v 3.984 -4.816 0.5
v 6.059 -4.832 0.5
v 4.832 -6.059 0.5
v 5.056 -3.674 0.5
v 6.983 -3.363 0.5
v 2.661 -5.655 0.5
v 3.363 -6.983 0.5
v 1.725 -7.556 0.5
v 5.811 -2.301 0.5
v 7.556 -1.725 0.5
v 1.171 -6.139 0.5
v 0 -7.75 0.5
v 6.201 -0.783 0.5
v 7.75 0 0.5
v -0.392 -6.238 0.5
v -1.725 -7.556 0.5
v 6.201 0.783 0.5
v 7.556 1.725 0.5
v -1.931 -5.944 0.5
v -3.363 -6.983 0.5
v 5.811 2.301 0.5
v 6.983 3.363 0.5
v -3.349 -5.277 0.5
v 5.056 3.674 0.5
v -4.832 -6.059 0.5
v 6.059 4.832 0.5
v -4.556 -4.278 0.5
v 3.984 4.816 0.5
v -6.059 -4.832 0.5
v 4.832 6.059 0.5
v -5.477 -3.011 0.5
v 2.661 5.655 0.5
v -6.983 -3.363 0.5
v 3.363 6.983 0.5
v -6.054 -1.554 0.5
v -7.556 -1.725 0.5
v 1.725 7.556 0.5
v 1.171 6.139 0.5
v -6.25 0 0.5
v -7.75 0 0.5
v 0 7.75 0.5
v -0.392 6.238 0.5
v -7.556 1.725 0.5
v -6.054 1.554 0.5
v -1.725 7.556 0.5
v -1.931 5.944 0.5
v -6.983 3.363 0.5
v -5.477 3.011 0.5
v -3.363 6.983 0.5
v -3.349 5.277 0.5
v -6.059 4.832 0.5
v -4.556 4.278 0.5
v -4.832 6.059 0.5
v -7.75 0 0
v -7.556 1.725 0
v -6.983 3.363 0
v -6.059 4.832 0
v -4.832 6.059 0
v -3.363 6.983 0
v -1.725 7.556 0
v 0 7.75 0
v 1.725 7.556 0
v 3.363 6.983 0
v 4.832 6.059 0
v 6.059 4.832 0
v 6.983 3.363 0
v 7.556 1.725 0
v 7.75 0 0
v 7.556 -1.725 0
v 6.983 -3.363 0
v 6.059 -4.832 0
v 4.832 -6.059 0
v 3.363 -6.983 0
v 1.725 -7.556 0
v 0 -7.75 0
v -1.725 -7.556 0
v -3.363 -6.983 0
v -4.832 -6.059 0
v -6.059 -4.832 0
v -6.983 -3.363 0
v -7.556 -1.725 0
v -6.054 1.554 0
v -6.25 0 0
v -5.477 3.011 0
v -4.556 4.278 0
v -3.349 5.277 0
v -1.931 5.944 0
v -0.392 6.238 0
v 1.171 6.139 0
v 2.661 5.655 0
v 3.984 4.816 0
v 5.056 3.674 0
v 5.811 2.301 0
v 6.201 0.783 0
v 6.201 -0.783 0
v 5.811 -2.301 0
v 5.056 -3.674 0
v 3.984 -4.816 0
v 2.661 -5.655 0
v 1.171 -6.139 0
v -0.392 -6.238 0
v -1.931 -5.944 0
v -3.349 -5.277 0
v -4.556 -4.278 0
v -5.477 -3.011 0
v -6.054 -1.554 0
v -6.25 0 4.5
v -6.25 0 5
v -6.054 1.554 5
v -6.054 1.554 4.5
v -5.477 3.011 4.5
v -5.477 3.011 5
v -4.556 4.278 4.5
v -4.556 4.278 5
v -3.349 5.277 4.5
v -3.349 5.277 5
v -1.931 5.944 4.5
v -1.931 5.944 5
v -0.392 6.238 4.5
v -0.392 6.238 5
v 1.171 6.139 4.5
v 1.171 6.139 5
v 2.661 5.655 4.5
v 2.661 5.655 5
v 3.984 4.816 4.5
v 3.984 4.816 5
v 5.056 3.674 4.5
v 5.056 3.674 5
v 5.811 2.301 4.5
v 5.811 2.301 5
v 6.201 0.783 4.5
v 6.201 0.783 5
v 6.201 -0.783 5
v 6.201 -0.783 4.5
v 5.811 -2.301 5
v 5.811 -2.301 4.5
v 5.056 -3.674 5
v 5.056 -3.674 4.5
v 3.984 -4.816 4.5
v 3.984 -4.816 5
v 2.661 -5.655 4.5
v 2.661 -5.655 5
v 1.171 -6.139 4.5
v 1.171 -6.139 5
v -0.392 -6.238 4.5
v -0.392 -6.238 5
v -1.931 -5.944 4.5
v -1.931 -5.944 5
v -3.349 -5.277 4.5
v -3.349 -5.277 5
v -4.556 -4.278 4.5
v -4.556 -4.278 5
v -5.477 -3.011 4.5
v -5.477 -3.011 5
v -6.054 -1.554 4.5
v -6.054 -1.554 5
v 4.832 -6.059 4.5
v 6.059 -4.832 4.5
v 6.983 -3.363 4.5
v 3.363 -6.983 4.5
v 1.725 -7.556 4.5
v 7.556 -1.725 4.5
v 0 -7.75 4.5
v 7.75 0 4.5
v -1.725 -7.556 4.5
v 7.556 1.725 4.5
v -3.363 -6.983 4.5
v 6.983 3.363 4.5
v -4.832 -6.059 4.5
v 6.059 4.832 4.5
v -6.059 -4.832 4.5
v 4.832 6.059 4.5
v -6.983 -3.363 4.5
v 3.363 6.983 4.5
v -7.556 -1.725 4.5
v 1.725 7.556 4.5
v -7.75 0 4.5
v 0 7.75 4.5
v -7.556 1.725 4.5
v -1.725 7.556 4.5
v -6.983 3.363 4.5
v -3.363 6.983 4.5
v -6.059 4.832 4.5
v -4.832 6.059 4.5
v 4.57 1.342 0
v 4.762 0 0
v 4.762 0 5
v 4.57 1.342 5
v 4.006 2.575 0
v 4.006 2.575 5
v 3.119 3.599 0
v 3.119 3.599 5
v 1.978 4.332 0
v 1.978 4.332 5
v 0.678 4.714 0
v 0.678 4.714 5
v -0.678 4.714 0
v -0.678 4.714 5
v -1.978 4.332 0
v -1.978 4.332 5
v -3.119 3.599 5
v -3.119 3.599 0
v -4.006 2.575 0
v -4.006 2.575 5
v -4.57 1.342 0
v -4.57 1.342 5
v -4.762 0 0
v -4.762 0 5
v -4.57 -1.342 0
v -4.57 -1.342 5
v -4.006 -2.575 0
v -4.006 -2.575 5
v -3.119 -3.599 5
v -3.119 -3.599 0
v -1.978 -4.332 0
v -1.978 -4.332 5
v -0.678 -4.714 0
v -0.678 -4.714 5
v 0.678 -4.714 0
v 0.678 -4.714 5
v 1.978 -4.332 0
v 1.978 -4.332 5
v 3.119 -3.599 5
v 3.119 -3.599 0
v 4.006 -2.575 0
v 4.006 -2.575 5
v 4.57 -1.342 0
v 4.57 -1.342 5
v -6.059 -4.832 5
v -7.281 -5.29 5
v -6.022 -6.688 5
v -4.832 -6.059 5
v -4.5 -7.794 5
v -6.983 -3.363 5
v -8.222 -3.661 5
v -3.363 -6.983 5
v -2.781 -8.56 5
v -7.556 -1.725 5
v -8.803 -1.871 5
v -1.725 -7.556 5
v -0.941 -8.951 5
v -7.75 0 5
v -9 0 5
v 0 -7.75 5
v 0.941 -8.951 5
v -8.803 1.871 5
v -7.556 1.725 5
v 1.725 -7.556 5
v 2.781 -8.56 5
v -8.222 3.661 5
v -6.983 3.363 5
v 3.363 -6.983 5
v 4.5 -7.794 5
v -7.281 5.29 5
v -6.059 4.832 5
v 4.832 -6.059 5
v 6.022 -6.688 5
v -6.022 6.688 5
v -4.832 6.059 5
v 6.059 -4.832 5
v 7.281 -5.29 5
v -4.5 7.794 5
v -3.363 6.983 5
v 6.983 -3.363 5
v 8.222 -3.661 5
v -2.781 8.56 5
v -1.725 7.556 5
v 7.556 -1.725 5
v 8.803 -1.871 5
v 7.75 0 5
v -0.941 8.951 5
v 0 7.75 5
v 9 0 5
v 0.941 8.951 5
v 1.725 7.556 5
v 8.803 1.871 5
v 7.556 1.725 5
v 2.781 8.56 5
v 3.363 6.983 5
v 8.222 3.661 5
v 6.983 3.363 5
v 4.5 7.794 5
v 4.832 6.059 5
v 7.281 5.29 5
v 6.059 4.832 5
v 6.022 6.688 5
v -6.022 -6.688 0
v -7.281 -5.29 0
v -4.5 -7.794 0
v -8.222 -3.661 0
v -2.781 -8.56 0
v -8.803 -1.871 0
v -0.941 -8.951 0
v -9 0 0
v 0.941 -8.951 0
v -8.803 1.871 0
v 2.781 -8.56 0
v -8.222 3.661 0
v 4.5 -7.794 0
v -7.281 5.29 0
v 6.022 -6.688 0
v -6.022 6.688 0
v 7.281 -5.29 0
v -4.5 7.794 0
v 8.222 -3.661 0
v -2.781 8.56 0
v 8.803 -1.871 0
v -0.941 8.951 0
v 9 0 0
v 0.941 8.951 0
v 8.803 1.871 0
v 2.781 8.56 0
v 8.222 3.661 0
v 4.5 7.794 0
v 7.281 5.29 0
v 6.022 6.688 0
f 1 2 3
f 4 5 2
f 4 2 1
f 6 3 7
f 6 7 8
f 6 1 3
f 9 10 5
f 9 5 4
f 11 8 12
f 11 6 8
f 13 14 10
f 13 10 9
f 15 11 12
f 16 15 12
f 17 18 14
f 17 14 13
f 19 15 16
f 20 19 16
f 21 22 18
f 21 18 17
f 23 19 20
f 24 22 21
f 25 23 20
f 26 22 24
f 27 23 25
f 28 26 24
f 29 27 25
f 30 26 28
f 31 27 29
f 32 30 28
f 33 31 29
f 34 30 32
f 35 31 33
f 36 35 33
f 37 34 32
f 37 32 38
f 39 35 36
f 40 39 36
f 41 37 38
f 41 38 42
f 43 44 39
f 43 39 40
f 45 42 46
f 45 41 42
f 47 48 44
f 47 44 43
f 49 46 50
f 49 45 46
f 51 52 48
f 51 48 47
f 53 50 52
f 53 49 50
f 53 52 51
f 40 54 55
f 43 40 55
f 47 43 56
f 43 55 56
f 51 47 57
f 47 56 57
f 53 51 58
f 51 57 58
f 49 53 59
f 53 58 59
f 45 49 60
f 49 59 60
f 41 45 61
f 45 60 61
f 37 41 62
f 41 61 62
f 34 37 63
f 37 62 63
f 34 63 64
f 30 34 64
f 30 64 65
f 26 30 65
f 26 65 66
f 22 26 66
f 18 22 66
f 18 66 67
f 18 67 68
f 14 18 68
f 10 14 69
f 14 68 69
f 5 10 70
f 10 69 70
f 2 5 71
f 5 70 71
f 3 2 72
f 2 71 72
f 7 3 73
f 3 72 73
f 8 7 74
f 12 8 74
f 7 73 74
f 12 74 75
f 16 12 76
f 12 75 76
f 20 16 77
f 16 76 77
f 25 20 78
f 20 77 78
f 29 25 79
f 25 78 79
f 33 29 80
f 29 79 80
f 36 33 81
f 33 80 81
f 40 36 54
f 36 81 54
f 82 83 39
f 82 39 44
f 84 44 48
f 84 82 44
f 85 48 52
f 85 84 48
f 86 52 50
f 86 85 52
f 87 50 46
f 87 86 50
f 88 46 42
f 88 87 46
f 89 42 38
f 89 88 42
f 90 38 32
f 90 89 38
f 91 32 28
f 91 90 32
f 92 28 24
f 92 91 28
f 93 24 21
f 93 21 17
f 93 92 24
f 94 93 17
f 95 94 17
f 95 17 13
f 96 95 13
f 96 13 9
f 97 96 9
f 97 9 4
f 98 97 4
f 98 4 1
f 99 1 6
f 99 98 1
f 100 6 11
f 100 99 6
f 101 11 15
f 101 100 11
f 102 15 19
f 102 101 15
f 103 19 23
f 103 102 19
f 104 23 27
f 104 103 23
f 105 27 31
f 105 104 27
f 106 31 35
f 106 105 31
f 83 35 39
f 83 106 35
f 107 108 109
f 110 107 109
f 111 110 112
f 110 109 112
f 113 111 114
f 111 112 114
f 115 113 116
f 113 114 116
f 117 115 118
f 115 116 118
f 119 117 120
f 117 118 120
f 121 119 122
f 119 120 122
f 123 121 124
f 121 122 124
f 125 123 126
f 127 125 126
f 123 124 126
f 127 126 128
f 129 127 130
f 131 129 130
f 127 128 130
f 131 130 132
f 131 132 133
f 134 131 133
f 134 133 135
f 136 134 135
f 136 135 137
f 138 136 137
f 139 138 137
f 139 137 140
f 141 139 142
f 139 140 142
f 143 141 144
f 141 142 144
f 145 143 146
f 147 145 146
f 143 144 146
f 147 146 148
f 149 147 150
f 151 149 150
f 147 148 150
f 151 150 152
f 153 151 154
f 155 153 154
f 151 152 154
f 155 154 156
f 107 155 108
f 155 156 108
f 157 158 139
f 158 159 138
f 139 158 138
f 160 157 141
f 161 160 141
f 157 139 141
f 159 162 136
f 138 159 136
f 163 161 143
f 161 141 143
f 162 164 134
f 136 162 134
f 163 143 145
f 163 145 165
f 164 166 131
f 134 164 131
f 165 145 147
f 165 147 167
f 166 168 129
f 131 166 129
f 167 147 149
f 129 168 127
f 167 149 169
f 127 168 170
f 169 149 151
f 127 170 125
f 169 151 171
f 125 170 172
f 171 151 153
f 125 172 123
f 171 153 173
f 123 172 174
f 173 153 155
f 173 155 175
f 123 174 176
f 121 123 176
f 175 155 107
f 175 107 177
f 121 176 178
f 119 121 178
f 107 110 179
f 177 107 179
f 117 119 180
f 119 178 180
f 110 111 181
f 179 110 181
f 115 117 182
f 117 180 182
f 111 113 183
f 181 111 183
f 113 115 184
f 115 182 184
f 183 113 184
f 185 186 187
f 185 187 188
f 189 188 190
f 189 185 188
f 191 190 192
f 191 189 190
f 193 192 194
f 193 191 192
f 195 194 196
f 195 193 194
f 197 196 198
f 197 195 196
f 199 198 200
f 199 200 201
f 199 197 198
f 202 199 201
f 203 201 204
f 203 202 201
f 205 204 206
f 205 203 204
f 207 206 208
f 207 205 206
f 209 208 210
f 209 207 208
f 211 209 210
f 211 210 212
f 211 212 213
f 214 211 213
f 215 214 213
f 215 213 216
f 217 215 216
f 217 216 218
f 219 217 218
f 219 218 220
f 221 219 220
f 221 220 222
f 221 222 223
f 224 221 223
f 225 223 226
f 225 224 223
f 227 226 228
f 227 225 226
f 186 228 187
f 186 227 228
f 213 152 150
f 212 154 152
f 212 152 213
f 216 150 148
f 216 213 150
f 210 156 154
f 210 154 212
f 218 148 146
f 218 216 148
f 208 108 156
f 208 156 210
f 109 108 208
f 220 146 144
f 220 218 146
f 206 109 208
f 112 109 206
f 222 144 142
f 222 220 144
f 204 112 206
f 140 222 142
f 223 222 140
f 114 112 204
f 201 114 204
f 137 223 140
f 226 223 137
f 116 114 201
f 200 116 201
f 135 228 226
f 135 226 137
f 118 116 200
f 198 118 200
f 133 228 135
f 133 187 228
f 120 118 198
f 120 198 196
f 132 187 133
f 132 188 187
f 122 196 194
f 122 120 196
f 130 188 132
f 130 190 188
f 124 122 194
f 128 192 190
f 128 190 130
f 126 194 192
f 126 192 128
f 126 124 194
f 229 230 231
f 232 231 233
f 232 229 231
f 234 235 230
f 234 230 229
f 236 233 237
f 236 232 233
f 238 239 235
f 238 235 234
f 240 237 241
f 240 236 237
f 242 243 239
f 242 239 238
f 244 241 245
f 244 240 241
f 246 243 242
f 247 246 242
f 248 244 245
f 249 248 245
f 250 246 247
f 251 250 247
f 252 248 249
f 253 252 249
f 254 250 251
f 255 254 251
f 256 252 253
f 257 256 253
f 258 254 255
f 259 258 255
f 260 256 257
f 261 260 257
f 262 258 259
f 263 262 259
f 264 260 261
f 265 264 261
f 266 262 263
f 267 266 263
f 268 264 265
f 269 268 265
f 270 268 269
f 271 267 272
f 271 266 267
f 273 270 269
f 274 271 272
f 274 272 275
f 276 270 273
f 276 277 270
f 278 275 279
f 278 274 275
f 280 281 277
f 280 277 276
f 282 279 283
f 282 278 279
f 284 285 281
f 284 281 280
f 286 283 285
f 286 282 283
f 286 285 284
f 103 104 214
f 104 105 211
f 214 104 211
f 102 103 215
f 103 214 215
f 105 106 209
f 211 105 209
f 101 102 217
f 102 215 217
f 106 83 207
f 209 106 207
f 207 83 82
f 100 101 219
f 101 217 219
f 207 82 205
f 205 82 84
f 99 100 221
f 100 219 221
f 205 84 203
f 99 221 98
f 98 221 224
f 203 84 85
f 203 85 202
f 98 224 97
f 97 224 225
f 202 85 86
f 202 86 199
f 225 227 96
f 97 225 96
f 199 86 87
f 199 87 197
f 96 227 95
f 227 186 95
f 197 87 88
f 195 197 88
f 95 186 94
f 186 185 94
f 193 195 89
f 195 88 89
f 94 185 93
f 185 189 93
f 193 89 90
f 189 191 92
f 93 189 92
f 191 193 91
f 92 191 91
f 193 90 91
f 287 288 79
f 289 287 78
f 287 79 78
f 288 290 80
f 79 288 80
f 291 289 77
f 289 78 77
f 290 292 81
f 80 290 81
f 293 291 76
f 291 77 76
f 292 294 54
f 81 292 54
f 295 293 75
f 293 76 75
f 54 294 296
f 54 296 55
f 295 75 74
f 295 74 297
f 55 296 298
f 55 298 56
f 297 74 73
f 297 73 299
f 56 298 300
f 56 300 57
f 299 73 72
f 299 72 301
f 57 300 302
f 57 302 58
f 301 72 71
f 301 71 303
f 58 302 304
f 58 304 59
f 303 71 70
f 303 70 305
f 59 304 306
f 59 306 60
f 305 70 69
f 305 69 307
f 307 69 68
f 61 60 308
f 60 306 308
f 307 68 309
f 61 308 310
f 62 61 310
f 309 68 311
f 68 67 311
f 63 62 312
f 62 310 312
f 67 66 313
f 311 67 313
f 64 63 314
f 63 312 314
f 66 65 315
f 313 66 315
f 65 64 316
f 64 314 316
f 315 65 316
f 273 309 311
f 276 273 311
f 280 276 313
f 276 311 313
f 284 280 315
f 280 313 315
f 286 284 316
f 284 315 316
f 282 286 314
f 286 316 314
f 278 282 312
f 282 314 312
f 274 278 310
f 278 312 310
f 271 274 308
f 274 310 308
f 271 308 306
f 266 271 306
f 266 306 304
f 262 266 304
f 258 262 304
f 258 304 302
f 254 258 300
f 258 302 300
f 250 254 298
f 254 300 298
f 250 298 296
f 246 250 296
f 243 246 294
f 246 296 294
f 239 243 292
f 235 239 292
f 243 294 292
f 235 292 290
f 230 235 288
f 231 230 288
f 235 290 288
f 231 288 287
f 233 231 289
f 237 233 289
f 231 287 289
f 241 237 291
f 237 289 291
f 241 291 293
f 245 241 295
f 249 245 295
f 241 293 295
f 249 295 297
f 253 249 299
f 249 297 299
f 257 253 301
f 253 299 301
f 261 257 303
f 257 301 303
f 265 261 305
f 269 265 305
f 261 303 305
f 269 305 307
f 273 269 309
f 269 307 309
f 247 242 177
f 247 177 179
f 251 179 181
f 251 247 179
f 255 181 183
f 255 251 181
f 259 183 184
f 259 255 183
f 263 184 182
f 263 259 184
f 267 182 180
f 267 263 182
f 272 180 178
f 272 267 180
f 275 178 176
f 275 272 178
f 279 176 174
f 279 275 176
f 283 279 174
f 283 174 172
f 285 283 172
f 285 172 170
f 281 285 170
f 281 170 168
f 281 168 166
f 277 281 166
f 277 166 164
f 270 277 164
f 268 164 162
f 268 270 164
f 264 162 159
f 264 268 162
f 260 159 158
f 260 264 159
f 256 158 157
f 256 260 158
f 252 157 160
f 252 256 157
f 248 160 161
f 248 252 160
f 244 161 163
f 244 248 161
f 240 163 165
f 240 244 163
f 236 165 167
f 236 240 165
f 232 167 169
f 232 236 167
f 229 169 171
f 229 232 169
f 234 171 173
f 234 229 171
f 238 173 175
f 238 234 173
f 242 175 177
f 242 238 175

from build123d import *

# Parameters (mm, degrees)
ESBO_O1_R                = 9
ESBO_O1_R_2              = 4.7625
RESSALTO_EXTRUS_O1_DEPTH = 5
ESBO_O2_R                = 7.75
ESBO_O2_R_2              = 6.25
CORTE_EXTRUS_O1_DEPTH    = 0.5


with BuildPart() as part:
    # Esboço1 → Ressalto-extrusão1 (new body)
    with BuildSketch(Plane.XY):
        Circle(ESBO_O1_R)
        Circle(ESBO_O1_R_2, mode=Mode.SUBTRACT)
    extrude(amount=RESSALTO_EXTRUS_O1_DEPTH)

    # Esboço2 → Corte-extrusão1 (cut)
    with BuildSketch(Plane(origin=(0, 0, 0), x_dir=(-1, 0, 0), z_dir=(0, 0, -1))):
        Circle(ESBO_O2_R)
        Circle(ESBO_O2_R_2, mode=Mode.SUBTRACT)
    corte_extrus_o1 = extrude(amount=-CORTE_EXTRUS_O1_DEPTH, mode=Mode.SUBTRACT)

    # Espelhar2: Corte-extrusão1 across plane
    add(corte_extrus_o1.mirror(Plane.XY.offset(2.5)), mode=Mode.SUBTRACT)


solid = part.part
